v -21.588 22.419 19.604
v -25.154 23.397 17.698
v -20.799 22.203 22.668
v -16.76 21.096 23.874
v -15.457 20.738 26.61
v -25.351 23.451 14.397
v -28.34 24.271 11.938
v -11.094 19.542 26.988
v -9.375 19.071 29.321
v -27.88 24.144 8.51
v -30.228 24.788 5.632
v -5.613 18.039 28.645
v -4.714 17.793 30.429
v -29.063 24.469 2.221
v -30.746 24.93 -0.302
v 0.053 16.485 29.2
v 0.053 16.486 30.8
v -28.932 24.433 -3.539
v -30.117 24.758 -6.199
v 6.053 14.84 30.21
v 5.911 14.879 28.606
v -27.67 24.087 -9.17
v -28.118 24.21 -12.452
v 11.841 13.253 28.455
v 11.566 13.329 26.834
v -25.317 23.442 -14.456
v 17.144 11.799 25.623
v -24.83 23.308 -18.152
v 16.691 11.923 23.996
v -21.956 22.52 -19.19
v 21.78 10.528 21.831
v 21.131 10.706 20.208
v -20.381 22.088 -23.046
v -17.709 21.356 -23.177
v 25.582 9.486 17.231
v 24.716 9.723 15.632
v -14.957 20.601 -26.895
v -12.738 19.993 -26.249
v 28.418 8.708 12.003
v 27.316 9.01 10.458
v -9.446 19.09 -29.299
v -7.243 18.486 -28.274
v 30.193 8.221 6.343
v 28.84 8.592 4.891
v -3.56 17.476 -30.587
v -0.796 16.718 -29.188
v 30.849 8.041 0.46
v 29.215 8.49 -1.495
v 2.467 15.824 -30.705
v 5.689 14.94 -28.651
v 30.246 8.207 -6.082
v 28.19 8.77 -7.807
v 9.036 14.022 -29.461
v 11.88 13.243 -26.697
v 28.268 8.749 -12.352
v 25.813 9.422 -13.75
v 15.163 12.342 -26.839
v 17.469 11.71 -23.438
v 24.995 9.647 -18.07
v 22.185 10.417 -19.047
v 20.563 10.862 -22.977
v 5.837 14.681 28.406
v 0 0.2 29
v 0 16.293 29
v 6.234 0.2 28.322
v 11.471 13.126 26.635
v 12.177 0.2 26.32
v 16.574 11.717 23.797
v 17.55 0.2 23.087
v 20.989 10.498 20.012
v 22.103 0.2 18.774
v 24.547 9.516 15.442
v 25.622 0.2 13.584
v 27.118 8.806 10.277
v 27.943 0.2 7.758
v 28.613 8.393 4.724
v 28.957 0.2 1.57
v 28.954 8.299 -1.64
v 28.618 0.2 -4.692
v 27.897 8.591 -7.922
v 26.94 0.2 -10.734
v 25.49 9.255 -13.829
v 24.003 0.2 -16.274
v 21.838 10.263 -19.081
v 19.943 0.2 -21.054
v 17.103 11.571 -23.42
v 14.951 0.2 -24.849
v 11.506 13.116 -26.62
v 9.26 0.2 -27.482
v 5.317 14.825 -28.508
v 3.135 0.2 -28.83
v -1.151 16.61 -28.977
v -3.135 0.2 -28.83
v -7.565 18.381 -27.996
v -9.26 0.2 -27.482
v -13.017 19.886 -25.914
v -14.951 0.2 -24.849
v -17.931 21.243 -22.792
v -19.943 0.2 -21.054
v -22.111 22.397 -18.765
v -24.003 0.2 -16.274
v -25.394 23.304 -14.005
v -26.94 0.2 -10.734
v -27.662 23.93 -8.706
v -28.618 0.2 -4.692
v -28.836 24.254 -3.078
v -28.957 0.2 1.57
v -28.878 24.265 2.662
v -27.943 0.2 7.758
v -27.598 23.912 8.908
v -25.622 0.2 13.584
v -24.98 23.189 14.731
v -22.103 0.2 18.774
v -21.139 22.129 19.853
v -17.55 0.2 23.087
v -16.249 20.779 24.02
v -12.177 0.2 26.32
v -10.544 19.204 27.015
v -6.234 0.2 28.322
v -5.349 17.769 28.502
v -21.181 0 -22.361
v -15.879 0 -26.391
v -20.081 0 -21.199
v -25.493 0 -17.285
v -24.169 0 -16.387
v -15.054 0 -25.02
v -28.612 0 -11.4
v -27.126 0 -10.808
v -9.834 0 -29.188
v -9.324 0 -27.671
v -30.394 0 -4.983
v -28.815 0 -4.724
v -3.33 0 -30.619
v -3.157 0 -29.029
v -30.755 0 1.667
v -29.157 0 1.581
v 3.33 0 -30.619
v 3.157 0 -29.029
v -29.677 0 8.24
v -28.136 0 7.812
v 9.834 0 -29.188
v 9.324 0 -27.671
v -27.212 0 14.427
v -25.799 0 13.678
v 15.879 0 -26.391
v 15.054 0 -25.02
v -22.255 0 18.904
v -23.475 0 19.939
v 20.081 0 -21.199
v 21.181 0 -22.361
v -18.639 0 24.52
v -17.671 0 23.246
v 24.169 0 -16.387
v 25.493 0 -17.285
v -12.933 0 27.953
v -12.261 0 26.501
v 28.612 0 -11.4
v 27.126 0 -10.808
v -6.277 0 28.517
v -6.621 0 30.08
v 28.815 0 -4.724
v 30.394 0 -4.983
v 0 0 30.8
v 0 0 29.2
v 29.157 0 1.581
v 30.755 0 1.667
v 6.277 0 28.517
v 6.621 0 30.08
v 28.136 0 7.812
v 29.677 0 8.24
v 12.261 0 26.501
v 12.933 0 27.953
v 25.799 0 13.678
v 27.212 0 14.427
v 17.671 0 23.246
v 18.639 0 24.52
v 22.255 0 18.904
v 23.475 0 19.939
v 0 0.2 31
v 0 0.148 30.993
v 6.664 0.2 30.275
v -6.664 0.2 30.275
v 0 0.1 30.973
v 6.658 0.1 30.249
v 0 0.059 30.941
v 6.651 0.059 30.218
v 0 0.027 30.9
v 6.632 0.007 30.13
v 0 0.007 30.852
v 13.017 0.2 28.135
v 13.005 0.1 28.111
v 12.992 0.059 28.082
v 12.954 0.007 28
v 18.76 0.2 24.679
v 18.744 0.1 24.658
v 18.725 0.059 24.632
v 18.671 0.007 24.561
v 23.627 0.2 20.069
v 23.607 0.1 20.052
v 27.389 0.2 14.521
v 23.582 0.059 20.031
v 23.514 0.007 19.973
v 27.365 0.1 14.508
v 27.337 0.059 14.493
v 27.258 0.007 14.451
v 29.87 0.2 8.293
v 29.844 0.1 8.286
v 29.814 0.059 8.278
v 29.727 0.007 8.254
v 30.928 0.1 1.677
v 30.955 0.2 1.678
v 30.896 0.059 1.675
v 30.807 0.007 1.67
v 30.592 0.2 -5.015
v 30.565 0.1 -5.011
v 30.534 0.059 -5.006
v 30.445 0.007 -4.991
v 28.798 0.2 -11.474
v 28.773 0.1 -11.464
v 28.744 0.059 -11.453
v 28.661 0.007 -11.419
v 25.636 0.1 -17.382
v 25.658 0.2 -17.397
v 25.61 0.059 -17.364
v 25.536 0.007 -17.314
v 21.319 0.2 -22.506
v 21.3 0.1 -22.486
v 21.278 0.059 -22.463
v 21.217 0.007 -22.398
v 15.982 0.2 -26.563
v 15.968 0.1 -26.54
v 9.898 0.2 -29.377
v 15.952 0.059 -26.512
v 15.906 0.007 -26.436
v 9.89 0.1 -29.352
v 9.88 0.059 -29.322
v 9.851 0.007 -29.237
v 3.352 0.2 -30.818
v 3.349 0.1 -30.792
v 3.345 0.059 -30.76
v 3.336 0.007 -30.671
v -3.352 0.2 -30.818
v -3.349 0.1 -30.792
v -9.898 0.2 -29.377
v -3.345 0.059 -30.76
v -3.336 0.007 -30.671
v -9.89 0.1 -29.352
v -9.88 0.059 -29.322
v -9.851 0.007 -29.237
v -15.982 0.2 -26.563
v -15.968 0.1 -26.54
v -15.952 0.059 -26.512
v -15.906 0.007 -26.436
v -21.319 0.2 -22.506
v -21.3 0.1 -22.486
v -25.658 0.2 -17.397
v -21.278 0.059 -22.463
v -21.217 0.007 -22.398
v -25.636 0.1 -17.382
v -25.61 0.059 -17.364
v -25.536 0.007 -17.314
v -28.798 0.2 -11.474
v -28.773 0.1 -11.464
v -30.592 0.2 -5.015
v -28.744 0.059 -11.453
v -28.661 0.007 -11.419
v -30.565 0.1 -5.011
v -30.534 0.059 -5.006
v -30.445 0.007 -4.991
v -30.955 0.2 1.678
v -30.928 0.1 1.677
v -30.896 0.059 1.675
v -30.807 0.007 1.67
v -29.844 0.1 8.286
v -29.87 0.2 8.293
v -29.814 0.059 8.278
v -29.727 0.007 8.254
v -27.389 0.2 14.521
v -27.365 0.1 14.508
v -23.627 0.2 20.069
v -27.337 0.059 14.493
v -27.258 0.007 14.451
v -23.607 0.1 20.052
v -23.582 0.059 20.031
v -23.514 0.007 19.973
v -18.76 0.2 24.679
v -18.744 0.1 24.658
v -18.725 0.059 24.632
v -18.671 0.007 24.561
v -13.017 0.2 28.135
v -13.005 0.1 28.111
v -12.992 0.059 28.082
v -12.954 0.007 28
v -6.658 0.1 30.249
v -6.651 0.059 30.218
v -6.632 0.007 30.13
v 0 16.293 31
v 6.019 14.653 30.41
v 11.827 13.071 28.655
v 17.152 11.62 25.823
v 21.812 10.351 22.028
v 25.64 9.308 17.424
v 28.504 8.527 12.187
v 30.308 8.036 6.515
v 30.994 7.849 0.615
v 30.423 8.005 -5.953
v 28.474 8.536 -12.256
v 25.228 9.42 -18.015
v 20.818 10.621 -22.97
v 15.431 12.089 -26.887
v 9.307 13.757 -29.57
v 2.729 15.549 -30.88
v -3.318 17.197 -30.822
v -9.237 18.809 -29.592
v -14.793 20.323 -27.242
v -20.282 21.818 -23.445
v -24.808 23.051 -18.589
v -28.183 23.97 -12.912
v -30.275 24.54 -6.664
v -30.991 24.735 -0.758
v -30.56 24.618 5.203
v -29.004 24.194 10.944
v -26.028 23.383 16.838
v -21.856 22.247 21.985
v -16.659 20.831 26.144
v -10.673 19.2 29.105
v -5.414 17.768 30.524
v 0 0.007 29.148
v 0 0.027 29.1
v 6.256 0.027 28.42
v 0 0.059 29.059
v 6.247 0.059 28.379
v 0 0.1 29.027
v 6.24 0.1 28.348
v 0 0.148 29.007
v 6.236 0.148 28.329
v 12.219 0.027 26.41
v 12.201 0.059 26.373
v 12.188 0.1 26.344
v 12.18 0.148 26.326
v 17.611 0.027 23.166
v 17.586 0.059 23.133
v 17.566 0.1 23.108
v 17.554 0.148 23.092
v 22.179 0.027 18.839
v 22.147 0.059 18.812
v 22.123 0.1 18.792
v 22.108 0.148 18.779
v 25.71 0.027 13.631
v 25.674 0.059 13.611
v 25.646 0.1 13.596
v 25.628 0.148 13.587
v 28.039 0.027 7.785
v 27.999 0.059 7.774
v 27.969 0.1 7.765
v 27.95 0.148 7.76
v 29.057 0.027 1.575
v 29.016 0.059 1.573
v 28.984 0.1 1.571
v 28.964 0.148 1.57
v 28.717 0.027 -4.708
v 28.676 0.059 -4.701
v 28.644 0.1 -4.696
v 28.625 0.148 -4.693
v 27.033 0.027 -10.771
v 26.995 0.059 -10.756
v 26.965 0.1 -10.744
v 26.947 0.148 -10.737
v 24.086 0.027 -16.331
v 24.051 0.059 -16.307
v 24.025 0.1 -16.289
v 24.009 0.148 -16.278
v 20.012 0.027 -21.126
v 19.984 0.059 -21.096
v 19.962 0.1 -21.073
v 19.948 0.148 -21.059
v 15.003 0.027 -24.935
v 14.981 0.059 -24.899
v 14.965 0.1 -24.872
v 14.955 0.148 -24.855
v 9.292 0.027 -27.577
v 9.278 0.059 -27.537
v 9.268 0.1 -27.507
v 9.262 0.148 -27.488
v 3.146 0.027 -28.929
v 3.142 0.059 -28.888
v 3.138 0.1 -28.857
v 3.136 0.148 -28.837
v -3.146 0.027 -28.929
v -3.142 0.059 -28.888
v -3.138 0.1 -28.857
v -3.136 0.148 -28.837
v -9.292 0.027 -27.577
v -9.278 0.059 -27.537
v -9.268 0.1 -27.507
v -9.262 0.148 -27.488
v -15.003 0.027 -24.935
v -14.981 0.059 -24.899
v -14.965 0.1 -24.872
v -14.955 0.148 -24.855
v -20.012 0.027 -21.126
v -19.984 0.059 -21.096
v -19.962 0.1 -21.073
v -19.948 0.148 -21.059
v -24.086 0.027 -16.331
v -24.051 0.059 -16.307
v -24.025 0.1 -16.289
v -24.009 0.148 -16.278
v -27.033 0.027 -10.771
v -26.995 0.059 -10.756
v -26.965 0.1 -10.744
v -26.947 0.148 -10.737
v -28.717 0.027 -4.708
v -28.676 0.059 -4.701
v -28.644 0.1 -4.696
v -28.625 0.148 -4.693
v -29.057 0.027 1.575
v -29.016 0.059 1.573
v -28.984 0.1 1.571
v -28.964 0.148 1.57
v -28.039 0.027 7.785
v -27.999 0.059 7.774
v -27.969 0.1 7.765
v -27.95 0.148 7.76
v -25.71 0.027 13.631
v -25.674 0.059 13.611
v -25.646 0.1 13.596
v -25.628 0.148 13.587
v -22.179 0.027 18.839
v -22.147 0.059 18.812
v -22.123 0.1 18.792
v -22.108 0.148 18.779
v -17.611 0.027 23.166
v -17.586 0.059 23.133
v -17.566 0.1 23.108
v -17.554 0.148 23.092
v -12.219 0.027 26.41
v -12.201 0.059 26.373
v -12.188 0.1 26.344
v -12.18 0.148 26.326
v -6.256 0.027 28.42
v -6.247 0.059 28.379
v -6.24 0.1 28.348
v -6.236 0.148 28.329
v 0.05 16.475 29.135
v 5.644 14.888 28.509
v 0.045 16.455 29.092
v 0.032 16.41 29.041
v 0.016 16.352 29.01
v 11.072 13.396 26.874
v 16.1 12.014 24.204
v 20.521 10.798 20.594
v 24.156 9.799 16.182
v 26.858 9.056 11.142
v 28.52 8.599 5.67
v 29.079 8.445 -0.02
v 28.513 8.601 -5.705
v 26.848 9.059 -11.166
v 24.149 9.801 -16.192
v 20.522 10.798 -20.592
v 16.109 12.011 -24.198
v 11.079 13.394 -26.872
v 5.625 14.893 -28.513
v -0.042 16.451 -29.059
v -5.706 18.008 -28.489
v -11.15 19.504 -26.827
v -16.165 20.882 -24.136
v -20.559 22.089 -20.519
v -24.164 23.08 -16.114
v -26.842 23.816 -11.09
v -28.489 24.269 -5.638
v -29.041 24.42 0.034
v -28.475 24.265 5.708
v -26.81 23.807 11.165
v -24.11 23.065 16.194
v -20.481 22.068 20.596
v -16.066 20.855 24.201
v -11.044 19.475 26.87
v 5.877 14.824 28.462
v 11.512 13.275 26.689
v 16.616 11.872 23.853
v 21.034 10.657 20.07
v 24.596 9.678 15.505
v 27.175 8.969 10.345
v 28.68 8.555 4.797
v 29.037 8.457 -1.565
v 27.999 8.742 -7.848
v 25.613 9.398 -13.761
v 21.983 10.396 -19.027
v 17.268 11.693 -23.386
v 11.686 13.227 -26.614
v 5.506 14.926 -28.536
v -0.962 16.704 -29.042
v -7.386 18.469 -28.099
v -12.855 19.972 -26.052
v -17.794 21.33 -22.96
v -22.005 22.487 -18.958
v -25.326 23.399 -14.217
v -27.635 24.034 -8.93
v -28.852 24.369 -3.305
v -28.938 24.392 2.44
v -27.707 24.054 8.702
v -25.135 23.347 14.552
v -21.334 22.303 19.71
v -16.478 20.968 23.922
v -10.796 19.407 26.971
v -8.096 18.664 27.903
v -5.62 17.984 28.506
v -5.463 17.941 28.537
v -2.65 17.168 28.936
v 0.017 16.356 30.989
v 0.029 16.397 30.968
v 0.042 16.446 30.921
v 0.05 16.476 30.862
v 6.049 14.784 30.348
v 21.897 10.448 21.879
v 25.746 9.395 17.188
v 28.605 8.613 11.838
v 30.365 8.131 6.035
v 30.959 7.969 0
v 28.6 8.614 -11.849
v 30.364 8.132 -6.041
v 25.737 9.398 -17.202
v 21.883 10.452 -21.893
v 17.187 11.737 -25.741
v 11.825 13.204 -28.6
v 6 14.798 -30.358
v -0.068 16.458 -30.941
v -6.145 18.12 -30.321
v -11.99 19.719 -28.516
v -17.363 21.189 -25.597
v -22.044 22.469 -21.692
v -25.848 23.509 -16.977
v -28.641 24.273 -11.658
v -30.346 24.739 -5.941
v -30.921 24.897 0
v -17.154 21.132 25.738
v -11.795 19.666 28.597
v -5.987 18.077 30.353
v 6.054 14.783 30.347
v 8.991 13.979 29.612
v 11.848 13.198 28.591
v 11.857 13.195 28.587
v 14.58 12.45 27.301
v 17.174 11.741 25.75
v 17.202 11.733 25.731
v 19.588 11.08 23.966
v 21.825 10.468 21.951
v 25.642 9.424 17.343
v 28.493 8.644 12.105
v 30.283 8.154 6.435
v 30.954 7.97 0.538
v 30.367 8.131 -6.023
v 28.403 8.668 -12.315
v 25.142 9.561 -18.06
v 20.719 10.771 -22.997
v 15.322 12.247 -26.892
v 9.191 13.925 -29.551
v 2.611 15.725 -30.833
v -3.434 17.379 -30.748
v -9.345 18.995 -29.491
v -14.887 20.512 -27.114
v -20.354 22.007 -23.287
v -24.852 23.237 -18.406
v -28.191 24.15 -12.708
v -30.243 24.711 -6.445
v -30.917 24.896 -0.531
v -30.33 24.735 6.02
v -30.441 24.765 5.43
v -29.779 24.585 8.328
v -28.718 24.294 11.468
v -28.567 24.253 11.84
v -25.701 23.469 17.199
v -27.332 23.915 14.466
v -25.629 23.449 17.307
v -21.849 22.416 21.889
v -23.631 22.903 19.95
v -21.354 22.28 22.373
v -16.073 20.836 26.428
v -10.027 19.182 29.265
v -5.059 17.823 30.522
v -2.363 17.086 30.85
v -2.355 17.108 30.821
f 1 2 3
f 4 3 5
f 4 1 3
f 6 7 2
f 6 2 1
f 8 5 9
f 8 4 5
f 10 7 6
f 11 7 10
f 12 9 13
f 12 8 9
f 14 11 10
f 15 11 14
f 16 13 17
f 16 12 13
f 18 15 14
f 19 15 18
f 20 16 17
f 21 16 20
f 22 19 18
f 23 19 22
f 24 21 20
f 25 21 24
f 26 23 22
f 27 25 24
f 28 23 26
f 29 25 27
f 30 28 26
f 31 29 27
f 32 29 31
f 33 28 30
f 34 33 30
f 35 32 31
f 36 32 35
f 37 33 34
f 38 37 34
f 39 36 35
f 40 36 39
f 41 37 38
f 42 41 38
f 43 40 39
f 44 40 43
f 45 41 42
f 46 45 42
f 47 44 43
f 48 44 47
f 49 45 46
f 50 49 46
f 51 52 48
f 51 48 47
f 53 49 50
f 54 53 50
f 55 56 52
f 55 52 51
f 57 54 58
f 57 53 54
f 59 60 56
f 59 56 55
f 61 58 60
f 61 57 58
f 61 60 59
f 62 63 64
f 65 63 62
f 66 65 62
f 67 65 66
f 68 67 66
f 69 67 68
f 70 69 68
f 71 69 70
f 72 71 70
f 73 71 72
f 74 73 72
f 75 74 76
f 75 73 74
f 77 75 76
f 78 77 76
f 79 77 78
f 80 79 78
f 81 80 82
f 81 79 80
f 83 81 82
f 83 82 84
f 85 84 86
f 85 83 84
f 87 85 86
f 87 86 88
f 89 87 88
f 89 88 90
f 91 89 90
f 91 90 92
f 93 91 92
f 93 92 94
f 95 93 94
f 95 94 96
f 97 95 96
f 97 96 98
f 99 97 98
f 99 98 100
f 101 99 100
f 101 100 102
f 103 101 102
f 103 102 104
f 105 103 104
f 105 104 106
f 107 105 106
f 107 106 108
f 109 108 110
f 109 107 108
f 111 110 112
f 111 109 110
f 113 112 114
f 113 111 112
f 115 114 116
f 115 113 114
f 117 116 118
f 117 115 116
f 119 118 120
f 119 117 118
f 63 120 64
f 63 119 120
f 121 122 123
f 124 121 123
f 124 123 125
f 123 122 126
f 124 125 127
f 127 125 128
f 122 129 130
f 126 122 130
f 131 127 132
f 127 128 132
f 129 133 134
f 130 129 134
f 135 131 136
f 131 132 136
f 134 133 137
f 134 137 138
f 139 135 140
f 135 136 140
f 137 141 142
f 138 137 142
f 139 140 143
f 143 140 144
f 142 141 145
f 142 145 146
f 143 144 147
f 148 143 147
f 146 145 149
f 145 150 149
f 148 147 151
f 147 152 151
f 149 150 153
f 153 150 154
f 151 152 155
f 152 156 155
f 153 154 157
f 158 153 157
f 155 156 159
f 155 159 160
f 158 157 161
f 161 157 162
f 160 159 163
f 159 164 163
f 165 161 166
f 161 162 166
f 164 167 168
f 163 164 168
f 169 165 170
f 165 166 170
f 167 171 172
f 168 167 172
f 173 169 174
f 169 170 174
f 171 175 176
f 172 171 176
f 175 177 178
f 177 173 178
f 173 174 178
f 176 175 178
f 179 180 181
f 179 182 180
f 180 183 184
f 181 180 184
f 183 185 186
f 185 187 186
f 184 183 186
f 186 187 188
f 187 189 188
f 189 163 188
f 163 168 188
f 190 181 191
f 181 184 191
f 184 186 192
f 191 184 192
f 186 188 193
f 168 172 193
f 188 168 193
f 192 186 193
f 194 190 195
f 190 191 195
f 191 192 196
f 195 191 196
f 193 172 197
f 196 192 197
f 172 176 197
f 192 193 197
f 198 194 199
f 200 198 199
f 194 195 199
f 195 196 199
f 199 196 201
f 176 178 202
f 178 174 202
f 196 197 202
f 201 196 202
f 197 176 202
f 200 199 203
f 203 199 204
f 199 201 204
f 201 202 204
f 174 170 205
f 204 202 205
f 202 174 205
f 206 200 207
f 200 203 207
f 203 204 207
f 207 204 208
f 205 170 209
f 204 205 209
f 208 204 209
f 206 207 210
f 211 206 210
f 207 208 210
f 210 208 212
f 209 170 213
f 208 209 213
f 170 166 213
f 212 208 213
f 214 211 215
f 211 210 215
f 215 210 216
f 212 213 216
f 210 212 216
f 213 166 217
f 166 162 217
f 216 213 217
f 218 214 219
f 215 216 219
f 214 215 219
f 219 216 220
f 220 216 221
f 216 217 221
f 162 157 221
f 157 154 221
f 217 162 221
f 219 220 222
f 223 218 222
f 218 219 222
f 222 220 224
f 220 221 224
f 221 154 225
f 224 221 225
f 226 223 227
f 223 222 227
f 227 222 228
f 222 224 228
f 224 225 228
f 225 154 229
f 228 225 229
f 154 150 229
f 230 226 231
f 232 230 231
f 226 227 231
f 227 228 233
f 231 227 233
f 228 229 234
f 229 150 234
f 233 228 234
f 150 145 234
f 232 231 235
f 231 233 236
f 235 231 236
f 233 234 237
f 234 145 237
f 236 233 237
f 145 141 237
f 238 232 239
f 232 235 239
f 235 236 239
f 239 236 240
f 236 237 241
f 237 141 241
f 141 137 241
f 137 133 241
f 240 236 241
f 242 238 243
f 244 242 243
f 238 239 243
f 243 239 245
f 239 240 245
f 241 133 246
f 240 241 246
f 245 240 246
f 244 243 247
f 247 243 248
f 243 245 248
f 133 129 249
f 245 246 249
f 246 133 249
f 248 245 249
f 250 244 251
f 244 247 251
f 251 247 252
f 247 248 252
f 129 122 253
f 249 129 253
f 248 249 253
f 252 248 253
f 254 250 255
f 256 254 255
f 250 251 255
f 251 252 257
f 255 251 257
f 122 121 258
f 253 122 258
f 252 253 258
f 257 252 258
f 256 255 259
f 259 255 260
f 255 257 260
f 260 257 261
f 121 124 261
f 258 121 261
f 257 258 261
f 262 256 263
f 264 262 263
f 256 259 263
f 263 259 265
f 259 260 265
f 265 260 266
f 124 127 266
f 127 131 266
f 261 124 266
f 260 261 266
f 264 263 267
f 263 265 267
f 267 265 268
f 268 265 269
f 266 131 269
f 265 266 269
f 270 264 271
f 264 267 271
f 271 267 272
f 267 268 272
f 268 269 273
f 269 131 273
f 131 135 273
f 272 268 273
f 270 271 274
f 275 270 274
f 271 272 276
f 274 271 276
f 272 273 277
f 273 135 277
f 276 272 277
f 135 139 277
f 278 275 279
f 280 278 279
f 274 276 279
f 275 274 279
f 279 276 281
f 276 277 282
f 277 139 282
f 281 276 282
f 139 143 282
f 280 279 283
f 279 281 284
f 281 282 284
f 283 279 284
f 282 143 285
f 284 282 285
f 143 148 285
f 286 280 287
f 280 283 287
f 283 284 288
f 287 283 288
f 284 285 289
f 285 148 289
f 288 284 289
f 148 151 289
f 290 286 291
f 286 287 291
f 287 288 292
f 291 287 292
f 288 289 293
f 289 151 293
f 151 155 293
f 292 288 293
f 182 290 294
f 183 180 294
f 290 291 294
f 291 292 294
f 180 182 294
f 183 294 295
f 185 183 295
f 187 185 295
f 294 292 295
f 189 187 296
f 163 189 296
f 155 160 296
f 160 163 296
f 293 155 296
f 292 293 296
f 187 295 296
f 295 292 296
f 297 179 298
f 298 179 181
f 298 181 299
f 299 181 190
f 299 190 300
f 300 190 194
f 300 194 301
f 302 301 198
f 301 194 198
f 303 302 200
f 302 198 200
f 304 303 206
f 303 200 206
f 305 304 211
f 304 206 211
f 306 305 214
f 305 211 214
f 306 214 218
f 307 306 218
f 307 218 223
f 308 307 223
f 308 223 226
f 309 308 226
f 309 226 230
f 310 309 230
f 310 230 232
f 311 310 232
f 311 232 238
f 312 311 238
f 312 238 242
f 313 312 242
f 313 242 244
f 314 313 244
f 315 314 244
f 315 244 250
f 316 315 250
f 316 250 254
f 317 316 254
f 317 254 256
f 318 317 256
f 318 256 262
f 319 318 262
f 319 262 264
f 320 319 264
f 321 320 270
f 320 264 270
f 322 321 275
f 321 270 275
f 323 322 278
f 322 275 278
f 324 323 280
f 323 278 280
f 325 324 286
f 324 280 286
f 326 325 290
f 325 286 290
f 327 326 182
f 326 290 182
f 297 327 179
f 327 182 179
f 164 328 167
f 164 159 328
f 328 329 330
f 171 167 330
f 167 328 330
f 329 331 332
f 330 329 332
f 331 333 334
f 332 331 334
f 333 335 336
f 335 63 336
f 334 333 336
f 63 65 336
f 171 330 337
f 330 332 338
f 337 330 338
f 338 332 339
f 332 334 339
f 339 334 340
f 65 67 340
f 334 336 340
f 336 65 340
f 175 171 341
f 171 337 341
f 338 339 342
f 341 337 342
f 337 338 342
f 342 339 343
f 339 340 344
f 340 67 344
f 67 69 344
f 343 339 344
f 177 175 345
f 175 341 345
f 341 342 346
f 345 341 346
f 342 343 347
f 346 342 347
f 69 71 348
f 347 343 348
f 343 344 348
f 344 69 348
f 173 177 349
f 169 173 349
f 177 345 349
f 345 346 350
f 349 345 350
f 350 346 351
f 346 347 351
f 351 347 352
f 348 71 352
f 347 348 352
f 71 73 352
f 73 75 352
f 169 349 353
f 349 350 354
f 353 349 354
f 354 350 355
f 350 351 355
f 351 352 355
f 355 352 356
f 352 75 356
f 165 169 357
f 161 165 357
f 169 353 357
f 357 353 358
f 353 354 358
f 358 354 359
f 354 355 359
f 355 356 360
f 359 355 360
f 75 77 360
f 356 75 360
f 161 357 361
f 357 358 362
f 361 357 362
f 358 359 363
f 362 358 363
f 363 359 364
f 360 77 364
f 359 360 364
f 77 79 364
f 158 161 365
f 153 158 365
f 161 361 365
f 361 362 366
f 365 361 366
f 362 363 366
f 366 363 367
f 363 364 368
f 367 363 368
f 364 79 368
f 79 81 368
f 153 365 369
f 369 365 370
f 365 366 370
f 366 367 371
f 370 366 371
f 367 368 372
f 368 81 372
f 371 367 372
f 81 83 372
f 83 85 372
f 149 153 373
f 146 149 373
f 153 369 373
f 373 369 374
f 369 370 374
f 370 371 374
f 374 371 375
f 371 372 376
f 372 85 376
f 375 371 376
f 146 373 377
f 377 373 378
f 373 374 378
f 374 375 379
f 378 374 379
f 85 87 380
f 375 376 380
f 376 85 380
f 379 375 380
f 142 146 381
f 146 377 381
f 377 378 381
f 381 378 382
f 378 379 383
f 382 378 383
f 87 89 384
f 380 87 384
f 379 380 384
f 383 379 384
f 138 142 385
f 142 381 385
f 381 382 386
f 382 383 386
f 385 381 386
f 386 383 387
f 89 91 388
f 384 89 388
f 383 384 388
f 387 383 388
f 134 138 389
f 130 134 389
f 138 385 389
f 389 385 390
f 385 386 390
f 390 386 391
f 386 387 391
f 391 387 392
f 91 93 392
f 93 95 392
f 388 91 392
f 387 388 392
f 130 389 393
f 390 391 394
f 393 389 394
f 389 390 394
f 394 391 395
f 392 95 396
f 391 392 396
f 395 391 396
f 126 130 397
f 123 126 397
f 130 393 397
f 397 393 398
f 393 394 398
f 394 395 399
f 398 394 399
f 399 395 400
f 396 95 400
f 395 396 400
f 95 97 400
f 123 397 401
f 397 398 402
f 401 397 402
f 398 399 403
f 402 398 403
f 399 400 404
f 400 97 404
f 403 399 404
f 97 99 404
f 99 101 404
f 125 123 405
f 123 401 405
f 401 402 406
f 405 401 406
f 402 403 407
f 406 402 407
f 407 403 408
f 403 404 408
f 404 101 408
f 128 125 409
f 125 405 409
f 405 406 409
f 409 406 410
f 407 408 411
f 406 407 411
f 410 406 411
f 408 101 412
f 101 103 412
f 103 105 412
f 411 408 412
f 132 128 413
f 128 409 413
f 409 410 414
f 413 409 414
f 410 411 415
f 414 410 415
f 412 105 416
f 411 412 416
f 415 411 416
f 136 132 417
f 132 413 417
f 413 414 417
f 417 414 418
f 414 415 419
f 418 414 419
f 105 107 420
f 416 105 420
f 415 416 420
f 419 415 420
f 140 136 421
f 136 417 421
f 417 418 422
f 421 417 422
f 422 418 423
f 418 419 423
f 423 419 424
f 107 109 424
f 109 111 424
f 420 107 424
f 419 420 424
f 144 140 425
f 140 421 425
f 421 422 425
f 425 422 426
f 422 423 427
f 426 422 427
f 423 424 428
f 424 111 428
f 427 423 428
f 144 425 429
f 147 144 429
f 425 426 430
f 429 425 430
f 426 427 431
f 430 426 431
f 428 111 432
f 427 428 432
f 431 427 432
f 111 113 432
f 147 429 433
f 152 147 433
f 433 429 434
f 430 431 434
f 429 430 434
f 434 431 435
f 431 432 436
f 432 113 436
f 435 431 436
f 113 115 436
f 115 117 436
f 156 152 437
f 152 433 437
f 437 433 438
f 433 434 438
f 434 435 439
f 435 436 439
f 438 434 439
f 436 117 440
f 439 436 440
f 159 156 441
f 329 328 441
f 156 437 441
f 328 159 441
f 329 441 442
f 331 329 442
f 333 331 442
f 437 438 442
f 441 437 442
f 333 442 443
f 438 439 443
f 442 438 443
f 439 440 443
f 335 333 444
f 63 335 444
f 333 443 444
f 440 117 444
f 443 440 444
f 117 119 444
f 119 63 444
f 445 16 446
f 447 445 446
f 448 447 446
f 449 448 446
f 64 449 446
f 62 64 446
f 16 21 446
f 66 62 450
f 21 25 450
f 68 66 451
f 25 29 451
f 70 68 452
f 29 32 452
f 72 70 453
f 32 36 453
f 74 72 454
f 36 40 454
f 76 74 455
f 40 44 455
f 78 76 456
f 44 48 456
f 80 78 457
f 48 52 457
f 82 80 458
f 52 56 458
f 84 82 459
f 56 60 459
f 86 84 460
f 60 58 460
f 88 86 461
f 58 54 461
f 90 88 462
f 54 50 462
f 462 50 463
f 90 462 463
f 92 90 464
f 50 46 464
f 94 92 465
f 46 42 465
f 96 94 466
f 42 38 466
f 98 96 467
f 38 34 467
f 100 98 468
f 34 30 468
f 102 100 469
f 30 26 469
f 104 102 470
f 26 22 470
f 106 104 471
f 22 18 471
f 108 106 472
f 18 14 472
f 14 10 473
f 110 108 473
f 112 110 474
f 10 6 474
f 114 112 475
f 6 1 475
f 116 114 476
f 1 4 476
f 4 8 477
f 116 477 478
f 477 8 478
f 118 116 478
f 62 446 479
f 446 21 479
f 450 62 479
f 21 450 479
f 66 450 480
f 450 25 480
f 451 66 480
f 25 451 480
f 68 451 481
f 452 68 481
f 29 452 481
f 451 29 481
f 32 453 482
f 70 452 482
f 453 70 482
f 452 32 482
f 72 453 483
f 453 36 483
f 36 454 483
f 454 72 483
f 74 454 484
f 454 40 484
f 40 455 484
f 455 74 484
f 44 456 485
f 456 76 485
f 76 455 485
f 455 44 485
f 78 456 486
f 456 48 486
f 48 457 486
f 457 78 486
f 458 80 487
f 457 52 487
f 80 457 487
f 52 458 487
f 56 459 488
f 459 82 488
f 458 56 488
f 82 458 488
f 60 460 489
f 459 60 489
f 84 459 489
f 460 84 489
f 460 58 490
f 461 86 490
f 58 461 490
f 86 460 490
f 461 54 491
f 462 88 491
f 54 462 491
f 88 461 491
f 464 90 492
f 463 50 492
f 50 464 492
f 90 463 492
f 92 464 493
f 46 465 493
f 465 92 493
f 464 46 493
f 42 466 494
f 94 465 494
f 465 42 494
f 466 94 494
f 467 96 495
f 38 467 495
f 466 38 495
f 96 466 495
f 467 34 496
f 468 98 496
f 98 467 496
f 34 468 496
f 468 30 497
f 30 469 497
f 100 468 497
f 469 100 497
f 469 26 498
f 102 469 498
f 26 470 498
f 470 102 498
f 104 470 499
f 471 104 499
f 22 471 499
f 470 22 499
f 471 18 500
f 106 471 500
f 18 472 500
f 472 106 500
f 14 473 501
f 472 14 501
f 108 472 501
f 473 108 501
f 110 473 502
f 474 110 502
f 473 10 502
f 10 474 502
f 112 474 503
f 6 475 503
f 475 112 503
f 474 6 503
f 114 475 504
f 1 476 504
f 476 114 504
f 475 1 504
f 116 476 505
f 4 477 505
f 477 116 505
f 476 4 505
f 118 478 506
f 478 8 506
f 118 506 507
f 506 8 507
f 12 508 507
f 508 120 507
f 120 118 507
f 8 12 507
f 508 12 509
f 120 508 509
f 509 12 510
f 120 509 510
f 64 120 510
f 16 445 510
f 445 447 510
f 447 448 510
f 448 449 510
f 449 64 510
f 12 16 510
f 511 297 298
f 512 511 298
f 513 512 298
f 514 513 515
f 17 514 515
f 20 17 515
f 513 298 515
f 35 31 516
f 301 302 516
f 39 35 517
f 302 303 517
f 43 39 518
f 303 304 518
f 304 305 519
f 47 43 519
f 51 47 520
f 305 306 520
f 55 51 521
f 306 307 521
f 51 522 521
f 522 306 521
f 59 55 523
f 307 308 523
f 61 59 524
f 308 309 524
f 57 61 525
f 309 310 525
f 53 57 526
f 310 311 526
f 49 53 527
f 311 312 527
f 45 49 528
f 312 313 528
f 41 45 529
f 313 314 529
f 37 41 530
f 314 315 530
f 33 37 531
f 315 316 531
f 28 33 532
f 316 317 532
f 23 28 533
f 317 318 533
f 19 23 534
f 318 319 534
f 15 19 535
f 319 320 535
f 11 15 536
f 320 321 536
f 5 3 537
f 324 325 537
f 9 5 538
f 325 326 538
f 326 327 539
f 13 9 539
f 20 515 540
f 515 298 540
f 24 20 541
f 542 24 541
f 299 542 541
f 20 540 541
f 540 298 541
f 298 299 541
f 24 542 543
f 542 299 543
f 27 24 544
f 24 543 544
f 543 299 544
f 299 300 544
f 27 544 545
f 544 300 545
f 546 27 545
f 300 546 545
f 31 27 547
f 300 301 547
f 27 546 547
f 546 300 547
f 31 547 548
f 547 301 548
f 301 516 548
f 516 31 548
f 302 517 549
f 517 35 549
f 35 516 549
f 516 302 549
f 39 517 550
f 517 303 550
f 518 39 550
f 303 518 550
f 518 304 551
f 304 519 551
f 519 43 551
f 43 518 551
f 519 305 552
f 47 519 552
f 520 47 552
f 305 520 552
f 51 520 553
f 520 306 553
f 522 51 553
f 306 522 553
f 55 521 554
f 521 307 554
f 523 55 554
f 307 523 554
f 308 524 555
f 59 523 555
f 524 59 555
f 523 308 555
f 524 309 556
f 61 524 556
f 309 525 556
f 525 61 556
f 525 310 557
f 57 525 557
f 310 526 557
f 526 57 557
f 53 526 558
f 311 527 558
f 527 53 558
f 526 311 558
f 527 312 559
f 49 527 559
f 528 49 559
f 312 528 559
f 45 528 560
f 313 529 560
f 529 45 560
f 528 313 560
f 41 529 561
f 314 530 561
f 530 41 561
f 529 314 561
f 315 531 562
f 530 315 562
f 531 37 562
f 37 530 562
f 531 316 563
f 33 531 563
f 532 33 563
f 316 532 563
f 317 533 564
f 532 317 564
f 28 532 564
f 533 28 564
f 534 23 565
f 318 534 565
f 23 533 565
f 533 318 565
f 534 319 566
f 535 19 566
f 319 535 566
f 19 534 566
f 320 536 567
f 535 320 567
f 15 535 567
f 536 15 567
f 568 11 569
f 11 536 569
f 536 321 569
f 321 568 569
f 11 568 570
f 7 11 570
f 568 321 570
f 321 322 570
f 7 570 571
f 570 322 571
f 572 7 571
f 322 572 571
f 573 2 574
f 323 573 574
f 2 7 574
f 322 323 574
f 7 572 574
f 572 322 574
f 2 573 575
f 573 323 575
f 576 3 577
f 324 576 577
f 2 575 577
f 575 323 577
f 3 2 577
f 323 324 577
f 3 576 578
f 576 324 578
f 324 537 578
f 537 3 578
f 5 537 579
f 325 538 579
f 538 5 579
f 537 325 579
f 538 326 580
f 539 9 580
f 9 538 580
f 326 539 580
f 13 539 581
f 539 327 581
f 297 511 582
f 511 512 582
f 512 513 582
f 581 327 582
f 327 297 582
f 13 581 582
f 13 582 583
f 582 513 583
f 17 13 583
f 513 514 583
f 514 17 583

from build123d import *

# Parameters (mm, degrees)
SKETCH1_R               = 31
SKETCH1_R_2             = 29
BOSS_EXTRUDE1_DEPTH     = 25
CUT_EXTRUDE1_DEPTH      = 51.467811524
CUT_EXTRUDE1_DEPTH_BACK = 51.467811524
FILLET1_R               = 0.2


with BuildPart() as part:
    # Sketch1 → Boss-Extrude1 (new body)
    with BuildSketch(Plane(origin=(0, 0, 0), x_dir=(1, 0, 0), z_dir=(0, 1, 0))):
        Circle(SKETCH1_R)
        Circle(SKETCH1_R_2, mode=Mode.SUBTRACT)
    extrude(amount=BOSS_EXTRUDE1_DEPTH)

    # Sketch2 → Cut-Extrude1 (cut, two sides: drawn at the far end of the back side and taken through both)
    with BuildSketch(Plane.XY.offset(-CUT_EXTRUDE1_DEPTH_BACK)):
        Polygon((-31, 25), (31, 8), (31, 25), align=None)
    extrude(amount=CUT_EXTRUDE1_DEPTH + CUT_EXTRUDE1_DEPTH_BACK, mode=Mode.SUBTRACT)

    # Fillet1
    fillet1_edges = [part.edges().sort_by_distance(p)[0] for p in [
        (2e-09, 16.5, 31),
        (-29, 24.451612903, 2.1945e-05),
        (-29, 0, 0),
        (-31, 0, 0),
    ]]
    fillet(fillet1_edges, radius=FILLET1_R)


solid = part.part
